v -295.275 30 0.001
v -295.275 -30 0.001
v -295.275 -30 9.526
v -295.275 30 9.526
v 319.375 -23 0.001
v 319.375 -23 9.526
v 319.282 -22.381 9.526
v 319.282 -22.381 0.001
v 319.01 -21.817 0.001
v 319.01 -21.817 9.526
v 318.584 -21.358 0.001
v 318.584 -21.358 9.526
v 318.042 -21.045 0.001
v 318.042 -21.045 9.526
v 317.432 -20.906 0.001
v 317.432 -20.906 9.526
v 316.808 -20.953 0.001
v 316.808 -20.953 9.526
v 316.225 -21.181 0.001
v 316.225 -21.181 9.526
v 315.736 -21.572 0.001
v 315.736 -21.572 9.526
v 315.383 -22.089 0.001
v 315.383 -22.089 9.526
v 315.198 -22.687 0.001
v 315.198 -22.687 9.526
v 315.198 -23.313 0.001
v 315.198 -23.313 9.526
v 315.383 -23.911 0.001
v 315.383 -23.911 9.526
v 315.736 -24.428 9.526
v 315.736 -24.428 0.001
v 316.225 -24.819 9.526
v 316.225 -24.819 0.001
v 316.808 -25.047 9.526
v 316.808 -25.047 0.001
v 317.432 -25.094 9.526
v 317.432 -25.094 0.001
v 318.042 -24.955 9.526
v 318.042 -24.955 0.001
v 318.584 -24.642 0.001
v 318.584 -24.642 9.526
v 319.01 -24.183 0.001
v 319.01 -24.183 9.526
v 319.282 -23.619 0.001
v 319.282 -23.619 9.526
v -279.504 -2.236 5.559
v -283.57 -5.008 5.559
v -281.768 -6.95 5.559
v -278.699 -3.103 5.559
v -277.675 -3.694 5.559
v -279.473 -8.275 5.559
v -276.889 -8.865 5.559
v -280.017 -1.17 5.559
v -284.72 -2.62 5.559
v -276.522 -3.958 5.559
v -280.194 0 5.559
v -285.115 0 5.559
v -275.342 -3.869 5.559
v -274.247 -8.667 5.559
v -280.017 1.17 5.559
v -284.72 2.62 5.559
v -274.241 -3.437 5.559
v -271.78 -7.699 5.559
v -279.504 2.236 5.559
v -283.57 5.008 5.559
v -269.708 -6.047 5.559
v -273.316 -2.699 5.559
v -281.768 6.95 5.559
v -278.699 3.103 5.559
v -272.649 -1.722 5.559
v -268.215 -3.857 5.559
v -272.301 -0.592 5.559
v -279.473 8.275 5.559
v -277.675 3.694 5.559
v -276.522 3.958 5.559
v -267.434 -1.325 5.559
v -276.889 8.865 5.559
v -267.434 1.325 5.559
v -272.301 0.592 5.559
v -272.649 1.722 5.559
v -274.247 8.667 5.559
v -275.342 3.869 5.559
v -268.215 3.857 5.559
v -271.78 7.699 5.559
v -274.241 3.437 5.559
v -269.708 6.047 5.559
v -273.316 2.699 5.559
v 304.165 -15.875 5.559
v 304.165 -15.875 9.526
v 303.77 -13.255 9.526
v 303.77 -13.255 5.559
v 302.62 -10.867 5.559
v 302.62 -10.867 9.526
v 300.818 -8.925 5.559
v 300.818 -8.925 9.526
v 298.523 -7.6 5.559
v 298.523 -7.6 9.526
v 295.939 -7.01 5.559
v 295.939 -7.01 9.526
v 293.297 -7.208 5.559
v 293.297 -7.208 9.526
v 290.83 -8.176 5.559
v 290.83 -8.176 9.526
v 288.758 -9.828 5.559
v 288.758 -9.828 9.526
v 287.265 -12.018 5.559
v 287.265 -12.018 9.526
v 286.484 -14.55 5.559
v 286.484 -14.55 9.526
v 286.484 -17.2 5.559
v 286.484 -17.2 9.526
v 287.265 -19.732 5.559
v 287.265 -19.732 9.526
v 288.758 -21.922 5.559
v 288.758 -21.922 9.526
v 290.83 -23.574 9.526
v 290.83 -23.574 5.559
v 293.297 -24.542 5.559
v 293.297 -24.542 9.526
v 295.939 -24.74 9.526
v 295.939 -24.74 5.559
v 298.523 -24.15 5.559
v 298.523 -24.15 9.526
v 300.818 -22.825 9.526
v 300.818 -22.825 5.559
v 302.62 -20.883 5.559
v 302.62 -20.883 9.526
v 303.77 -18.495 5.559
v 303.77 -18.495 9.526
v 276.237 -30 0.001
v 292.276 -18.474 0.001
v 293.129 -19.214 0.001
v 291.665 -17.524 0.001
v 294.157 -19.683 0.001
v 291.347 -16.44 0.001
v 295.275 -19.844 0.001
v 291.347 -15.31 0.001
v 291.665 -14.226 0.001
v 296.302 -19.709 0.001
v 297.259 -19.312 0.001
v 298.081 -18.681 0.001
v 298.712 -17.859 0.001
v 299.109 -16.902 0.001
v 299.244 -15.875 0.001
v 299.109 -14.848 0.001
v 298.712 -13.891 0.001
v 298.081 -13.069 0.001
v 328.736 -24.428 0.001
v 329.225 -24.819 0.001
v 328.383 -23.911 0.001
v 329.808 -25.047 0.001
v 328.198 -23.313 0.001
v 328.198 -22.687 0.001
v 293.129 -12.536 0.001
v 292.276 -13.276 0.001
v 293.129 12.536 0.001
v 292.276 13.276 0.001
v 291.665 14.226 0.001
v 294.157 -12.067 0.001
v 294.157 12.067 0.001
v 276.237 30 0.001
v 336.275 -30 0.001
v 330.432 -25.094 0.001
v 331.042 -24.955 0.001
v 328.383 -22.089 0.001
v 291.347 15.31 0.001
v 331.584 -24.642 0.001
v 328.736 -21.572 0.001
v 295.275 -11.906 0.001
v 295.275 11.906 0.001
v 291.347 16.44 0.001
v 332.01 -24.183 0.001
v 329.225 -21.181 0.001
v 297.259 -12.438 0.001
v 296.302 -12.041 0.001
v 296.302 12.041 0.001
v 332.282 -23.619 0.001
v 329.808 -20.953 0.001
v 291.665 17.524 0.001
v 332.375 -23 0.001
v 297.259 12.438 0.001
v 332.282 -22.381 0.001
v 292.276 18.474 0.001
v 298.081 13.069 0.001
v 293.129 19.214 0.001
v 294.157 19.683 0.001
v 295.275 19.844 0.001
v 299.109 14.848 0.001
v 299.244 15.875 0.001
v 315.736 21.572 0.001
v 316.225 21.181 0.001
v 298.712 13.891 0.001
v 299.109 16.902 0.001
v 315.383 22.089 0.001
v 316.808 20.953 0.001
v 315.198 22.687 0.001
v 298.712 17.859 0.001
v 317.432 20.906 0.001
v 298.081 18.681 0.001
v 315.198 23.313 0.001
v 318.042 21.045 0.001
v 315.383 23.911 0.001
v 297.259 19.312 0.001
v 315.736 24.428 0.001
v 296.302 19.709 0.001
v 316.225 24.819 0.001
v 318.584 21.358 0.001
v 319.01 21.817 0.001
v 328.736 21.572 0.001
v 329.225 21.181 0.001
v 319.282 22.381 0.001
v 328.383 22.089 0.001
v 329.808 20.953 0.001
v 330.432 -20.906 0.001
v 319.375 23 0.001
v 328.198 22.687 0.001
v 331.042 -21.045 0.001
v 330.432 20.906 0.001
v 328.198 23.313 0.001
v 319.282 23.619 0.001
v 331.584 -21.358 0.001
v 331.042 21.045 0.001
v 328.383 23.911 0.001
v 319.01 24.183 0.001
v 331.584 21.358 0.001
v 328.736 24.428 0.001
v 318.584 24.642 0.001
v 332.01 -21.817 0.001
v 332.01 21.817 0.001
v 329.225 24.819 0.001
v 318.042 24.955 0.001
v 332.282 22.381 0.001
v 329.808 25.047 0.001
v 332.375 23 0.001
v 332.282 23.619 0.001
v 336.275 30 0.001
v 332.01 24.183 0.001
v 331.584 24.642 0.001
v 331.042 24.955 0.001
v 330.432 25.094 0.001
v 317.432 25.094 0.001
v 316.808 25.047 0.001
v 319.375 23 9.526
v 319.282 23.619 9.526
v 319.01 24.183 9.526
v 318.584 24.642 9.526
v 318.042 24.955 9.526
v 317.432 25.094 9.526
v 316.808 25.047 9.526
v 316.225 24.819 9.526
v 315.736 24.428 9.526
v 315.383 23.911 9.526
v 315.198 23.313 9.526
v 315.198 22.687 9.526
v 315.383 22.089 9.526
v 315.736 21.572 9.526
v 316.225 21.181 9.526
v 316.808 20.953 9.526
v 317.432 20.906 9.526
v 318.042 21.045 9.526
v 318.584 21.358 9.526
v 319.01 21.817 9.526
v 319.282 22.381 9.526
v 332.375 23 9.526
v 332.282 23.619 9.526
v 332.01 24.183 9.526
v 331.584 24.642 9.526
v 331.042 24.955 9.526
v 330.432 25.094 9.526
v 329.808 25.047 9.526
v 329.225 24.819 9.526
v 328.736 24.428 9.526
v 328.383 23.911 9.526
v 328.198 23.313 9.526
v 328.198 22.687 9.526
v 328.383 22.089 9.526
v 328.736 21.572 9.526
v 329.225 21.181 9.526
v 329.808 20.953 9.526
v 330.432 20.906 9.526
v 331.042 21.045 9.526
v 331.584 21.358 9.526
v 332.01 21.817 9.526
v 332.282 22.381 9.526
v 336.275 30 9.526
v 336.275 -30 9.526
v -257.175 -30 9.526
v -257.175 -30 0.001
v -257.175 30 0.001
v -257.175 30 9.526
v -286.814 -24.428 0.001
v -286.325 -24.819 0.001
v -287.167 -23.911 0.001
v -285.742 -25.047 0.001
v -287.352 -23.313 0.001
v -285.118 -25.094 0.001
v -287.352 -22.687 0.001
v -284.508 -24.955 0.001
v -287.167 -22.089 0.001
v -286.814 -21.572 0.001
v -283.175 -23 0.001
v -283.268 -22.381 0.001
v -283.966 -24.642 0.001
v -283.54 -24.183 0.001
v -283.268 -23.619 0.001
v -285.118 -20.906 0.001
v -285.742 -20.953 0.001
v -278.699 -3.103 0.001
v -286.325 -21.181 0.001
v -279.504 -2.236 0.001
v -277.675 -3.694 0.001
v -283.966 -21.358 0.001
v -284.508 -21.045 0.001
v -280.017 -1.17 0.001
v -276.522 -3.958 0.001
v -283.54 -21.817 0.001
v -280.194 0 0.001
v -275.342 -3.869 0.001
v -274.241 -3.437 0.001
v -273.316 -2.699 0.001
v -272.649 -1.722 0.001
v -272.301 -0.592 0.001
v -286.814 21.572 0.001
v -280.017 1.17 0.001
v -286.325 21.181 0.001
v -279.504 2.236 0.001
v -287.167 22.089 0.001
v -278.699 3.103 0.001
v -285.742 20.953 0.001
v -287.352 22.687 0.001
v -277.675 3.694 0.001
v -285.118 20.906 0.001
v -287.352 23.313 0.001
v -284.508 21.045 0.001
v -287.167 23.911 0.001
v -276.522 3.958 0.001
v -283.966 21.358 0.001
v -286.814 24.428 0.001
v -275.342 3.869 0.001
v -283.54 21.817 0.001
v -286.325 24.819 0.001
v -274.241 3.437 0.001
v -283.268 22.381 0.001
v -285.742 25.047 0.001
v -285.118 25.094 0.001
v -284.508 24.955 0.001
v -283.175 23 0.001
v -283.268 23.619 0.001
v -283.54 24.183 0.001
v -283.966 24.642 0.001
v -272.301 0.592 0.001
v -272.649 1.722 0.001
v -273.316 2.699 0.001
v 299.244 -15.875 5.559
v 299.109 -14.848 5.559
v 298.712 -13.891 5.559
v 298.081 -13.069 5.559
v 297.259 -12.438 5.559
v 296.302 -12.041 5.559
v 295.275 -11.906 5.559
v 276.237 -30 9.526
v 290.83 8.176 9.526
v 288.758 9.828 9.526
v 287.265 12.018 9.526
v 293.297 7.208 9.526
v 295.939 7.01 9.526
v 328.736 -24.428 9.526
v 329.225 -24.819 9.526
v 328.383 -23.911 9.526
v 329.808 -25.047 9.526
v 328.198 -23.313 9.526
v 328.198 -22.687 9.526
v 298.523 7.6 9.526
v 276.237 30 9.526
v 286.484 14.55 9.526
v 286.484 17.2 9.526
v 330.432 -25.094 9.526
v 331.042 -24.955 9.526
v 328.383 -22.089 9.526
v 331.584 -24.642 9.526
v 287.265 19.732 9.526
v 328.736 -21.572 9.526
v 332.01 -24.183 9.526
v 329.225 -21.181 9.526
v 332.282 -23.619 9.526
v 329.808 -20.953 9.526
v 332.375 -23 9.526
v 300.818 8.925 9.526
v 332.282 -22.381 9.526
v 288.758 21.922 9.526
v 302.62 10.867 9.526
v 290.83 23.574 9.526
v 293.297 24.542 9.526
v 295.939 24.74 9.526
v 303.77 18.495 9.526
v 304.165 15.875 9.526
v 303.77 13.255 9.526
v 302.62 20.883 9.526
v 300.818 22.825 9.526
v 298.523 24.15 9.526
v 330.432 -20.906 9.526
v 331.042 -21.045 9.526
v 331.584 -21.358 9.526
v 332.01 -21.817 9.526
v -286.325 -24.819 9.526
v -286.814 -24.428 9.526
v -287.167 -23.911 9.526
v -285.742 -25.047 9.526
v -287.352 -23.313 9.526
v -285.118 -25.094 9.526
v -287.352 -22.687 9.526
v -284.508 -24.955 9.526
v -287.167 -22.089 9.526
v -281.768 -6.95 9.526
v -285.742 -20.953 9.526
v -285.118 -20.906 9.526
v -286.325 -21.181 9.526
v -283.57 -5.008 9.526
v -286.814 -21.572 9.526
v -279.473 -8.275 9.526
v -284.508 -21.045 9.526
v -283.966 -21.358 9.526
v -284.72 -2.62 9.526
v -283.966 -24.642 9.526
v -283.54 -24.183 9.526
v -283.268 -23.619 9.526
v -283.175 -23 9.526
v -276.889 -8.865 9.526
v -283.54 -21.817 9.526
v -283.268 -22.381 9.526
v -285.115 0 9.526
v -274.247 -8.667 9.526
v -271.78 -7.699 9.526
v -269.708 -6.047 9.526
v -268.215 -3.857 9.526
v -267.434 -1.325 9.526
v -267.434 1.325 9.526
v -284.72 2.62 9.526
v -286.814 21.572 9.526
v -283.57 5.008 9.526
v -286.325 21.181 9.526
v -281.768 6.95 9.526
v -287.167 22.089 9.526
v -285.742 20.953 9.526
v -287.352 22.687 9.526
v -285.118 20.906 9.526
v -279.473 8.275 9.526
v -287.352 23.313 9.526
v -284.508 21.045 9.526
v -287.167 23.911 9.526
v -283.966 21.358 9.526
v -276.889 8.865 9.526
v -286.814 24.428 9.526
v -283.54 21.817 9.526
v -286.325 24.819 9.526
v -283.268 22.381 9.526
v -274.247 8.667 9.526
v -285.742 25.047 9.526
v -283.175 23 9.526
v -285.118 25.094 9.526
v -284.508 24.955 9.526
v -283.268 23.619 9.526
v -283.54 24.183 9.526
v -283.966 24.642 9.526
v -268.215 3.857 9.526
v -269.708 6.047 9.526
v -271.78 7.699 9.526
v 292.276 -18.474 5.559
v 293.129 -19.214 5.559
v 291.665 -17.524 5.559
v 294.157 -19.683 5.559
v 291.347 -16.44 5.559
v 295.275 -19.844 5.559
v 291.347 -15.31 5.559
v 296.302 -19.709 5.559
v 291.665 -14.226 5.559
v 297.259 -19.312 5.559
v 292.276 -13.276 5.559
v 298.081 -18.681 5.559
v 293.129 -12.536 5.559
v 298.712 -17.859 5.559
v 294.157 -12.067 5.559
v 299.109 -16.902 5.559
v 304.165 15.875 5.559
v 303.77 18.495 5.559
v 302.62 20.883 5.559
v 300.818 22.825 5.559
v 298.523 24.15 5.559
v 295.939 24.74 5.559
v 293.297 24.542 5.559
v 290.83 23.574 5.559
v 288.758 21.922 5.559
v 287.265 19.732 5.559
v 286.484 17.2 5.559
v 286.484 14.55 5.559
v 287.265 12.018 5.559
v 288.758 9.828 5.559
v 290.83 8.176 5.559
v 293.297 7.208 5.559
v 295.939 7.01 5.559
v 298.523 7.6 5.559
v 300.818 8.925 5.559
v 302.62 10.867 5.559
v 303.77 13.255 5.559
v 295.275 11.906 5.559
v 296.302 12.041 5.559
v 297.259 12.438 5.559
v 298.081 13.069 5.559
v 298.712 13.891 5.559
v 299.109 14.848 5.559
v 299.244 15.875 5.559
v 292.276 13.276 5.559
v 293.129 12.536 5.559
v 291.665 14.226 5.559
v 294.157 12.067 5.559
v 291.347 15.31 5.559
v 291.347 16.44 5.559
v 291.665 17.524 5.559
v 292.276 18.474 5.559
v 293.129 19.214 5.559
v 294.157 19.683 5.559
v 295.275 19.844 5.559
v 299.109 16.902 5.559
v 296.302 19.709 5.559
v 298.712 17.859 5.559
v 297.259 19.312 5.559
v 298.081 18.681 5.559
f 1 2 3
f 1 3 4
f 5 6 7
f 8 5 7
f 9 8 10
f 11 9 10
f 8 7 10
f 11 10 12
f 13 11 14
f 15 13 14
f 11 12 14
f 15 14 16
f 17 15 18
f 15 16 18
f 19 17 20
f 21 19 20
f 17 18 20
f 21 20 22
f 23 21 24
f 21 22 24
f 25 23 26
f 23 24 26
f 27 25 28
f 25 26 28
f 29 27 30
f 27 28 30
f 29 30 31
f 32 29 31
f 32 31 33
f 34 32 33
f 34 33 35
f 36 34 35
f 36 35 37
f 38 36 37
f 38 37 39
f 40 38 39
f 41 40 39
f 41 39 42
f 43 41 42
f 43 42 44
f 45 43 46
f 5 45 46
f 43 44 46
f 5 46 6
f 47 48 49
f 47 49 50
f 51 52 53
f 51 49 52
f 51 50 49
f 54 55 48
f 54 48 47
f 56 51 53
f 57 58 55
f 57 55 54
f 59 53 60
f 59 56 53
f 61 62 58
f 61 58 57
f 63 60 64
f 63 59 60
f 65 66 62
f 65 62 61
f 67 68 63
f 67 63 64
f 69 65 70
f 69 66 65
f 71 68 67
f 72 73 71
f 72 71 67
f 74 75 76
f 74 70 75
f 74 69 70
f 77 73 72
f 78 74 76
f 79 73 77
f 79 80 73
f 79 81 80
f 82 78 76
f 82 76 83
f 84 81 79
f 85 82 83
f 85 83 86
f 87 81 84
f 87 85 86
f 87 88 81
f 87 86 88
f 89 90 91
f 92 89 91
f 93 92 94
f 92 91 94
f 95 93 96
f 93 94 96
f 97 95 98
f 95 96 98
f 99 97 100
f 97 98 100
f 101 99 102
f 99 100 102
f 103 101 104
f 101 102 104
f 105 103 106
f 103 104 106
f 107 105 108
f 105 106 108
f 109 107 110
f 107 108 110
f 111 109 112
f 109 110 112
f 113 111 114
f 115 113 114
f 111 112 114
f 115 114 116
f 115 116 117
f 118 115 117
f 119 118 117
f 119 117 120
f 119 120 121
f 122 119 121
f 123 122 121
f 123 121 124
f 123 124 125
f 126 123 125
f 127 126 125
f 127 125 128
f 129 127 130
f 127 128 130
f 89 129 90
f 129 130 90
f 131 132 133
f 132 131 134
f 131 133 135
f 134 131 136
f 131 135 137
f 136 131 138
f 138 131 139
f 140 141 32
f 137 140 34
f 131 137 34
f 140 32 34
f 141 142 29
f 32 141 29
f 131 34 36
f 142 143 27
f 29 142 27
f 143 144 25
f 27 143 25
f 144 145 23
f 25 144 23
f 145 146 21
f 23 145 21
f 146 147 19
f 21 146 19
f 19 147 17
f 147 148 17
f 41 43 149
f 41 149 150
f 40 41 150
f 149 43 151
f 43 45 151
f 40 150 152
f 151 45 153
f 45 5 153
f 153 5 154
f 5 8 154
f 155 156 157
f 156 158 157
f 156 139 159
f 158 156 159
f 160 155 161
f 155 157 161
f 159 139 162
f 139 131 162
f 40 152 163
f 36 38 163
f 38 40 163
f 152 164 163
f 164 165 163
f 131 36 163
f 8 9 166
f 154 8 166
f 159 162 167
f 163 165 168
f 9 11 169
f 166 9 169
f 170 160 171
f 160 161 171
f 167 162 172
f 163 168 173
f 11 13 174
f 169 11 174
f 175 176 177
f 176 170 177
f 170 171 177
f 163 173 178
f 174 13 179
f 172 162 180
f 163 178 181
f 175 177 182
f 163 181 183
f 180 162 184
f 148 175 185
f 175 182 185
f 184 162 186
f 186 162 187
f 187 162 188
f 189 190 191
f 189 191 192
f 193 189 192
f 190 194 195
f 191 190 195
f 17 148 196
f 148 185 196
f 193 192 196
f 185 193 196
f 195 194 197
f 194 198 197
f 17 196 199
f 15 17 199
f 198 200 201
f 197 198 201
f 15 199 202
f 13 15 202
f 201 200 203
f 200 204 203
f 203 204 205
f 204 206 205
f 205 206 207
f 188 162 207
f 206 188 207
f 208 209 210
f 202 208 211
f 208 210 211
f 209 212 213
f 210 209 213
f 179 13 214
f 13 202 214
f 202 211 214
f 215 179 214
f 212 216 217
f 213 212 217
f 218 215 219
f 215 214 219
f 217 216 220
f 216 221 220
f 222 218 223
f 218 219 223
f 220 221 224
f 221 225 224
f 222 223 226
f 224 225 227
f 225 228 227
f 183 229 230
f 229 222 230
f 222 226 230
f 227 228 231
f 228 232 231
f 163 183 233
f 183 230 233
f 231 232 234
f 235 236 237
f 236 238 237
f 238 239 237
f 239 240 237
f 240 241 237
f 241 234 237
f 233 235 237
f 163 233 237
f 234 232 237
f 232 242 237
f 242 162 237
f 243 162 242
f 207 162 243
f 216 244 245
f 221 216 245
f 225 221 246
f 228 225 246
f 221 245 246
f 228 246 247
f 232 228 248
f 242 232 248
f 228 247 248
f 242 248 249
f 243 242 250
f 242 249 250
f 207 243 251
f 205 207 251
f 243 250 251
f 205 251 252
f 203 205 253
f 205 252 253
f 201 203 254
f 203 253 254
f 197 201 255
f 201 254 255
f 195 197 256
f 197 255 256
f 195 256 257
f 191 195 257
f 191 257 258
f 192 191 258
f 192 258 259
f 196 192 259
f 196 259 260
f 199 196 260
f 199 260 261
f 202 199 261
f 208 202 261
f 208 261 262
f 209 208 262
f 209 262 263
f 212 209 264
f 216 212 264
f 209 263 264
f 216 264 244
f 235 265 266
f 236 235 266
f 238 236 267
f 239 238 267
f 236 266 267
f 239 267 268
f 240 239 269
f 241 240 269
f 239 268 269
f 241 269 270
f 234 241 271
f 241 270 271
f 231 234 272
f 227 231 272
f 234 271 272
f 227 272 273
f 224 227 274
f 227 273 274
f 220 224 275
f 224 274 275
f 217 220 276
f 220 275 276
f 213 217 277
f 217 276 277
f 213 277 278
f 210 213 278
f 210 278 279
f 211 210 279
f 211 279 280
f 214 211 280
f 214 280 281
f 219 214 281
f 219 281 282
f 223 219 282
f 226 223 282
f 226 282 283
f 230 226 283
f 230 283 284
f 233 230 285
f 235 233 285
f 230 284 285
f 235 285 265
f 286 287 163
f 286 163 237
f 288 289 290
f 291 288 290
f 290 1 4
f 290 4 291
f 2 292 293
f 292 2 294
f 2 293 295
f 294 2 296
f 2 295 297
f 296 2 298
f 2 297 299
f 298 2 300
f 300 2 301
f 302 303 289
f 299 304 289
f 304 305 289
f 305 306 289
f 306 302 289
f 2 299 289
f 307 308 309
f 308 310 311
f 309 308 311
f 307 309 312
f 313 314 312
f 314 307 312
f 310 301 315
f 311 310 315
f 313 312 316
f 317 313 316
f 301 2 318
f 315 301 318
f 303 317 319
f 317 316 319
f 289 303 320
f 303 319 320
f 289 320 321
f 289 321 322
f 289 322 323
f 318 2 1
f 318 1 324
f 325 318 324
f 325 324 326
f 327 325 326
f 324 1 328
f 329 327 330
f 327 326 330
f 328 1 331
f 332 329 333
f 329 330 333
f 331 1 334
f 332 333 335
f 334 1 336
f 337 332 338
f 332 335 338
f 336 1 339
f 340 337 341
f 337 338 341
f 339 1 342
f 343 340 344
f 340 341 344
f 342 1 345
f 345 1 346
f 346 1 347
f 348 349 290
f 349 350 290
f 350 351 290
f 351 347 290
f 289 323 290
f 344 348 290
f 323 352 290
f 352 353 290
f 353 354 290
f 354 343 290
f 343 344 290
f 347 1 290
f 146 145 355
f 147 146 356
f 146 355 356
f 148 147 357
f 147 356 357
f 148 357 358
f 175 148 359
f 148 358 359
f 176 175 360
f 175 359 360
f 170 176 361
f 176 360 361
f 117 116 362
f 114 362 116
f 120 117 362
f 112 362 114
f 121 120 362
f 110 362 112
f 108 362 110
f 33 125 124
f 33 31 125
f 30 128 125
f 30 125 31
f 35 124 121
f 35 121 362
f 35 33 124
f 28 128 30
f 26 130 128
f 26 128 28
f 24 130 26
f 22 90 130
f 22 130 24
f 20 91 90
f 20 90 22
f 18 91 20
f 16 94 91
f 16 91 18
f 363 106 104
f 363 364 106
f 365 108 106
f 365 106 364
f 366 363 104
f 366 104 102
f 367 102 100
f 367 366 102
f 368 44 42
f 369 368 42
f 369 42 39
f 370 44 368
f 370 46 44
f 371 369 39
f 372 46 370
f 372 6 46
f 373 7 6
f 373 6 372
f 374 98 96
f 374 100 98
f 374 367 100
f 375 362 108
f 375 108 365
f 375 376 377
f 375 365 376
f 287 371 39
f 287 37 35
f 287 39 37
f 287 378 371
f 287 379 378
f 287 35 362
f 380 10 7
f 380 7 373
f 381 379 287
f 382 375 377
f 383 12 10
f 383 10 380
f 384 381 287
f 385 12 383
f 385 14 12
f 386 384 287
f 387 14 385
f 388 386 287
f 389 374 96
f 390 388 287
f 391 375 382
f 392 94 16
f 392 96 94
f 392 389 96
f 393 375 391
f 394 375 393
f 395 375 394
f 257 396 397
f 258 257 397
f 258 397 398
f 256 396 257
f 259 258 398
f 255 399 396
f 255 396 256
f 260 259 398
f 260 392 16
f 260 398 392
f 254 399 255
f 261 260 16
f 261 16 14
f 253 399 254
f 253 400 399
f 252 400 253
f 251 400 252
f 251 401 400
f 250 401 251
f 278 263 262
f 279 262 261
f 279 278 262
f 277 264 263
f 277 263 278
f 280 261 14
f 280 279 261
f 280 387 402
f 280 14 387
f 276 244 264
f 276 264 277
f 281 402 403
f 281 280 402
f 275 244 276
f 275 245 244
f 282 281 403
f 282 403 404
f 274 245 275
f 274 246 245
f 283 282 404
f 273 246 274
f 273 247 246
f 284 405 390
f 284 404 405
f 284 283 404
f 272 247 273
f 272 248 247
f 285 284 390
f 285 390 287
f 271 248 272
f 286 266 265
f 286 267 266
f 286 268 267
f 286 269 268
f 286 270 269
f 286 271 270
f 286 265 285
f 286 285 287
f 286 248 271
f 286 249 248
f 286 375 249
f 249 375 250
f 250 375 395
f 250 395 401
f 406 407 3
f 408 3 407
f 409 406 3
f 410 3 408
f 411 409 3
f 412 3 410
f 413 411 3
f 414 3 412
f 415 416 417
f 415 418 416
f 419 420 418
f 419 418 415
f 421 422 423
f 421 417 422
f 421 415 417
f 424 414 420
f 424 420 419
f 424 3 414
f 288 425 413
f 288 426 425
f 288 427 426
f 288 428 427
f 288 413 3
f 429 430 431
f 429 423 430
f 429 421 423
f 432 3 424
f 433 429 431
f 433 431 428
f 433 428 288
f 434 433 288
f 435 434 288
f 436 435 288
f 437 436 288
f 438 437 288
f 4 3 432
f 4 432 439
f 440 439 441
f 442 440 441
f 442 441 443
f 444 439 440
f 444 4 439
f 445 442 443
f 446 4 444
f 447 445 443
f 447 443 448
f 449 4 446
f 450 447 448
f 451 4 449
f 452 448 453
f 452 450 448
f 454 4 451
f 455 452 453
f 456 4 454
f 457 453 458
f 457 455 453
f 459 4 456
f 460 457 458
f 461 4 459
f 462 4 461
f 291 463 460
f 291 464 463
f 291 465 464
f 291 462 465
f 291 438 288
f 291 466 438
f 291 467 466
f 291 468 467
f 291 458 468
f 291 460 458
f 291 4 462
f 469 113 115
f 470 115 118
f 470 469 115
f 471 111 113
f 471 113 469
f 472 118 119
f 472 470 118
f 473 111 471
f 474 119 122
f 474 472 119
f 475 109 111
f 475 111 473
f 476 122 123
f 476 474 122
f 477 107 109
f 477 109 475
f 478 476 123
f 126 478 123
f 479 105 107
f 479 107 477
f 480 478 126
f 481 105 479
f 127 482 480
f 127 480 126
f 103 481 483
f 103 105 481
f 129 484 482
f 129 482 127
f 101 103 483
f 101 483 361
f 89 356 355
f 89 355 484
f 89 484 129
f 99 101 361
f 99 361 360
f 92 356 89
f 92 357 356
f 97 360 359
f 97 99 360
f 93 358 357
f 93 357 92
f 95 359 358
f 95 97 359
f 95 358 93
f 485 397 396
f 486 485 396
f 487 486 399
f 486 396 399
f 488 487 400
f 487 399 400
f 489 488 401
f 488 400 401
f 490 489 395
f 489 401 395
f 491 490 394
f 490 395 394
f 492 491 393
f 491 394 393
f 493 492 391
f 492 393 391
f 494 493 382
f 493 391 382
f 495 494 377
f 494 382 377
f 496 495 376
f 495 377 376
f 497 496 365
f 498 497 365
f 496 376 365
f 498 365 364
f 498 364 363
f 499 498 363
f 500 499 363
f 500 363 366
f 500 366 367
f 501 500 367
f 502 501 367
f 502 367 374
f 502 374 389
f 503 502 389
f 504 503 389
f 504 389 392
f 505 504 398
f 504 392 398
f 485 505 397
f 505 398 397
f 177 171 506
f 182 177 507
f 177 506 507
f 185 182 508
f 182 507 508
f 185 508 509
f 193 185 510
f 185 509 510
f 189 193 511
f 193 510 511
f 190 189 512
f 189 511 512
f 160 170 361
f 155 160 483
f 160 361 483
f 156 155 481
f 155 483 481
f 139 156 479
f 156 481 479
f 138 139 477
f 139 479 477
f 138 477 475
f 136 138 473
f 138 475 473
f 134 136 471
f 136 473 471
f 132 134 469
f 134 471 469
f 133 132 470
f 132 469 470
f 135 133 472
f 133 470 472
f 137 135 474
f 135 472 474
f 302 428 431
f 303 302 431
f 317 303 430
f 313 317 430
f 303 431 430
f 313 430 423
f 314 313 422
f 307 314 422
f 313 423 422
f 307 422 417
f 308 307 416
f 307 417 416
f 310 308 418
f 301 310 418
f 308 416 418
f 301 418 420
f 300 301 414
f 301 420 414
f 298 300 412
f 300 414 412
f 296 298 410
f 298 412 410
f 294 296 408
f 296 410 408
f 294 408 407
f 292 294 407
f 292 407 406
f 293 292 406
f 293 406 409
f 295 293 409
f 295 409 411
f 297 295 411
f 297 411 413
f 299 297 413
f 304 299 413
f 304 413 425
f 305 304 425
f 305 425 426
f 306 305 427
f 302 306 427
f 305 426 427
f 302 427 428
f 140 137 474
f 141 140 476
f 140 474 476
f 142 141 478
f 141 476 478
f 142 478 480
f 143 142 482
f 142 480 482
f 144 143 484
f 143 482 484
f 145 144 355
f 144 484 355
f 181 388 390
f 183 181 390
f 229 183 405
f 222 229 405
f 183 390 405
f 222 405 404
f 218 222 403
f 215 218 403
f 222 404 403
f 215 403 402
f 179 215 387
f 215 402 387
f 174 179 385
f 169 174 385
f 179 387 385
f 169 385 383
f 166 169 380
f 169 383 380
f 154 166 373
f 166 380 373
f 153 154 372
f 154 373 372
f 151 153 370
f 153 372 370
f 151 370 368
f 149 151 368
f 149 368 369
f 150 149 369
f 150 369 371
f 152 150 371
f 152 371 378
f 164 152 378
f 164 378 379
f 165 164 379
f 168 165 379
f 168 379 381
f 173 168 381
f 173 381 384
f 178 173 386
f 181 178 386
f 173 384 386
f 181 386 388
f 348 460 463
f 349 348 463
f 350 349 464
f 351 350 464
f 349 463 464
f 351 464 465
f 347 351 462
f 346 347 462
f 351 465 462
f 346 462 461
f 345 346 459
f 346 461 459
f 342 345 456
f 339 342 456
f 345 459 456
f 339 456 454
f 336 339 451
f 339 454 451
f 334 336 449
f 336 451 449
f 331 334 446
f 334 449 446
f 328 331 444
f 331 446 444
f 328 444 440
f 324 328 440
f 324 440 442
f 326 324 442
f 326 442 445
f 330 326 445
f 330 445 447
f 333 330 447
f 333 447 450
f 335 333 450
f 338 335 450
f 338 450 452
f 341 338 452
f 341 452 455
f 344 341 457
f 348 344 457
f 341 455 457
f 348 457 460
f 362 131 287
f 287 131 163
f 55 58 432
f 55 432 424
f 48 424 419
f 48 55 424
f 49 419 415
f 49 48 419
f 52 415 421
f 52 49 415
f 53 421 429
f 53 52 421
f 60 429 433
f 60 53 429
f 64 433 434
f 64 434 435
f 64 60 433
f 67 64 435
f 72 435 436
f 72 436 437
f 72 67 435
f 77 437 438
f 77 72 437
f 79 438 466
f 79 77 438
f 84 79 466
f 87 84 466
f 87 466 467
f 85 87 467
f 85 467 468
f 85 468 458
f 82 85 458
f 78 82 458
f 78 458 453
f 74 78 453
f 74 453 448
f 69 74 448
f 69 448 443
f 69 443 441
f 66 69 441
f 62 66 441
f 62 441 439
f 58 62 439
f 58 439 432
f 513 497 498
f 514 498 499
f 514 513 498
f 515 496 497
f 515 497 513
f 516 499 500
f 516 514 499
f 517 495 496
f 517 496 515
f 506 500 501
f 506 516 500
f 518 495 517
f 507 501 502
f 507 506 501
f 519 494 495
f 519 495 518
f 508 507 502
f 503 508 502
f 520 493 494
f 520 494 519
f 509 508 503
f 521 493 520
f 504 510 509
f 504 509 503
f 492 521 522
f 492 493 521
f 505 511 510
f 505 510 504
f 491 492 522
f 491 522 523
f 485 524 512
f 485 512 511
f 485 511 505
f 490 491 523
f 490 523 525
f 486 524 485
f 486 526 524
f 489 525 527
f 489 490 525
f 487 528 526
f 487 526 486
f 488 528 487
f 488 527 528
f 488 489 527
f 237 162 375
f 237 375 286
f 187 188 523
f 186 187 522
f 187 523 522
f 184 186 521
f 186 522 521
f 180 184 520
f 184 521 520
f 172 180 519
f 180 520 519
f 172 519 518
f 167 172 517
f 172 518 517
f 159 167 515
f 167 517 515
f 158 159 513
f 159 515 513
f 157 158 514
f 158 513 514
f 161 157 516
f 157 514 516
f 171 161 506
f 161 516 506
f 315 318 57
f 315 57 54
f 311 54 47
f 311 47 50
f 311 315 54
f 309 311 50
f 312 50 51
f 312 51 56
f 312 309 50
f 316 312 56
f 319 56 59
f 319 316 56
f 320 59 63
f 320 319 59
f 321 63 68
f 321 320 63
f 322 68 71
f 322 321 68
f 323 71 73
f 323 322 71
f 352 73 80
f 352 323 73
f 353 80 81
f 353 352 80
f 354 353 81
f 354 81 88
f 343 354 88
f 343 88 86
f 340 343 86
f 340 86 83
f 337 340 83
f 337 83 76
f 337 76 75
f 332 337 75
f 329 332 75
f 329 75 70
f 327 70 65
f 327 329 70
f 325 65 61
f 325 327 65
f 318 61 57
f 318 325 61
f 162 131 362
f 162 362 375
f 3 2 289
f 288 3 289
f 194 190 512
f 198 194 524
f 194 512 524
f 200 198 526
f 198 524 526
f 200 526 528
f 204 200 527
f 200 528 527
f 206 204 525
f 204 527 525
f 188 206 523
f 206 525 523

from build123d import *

# Parameters (mm, degrees)
SKETCH2_W                                 = 66.588019288
SKETCH2_H                                 = 60
MAIN_EXTRUSION_DEPTH                      = 5.55752
SKETCH2_W_2                               = 38.1
SKETCH2_R                                 = 3.96875
MAIN_EXTRUSION_2_DEPTH                    = 5.55752
SKETCH2_3_W                               = 66.588019288
SKETCH2_3_H                               = 60
SKETCH2_3_W_2                             = 38.1
SKETCH2_3_R                               = 8.89
COUNTERBORE_EXTRUSION_DEPTH               = 9.525
SKETCH3_R                                 = 2.1
M5_THREADED_HOLSE_FOR_FRONT_BRACKET_DEPTH = 9.525
SKETCH5_R                                 = 2.1
M5_THREADED_HOLES_FOR_BRACKET_DEPTH       = 9.525
CENTRE_BORE_DEPTH                         = 345.266911292
SKETCH6_3_R                               = 8.89
SKETCH6_3_R_2                             = 3.96875
COUNTERBORE_DEPTH                         = 3.96748
SKETCH7_W                                 = 6.55
SKETCH7_H                                 = 60
STUPID_CUT_DEPTH                          = 345.266911292


with BuildPart() as part:
    # Sketch2 → Main Extrusion (new body)
    with BuildSketch(Plane(origin=(-0.000152858, 6.01e-07, 0.001029772), x_dir=(1, 0, 0), z_dir=(0, 0, 1))):
        with Locations((309.531143156, -6.01e-07)):
            Rectangle(SKETCH2_W, SKETCH2_H)
    extrude(amount=MAIN_EXTRUSION_DEPTH)



with BuildPart() as body_2:
    # Sketch2 → Main Extrusion 2 (new body)
    with BuildSketch(Plane(origin=(-0.000152858, 6.01e-07, 0.001029772), x_dir=(1, 0, 0), z_dir=(0, 0, 1))):
        with Locations((-276.224847142, -6.01e-07)):
            Rectangle(SKETCH2_W_2, SKETCH2_H)
        with Locations(Location((-276.224847142, -6.01e-07, 0), (0, 0, 180))):
            Circle(SKETCH2_R, mode=Mode.SUBTRACT)
    extrude(amount=MAIN_EXTRUSION_2_DEPTH)


with BuildPart() as part_1:
    add(part.part)

    add(body_2.part)  # Counterbore extrusion merges body 2
    # Sketch2<3> → Counterbore extrusion (add)
    # profile 1 of 2: a face of its own
    with BuildSketch(Plane(origin=(-0.000152858, 6.01e-07, 0.001029772), x_dir=(1, 0, 0), z_dir=(0, 0, 1))):
        with Locations((309.531143156, -6.01e-07)):
            Rectangle(SKETCH2_3_W, SKETCH2_3_H)
    # profile 2 of 2: a face of its own
    with BuildSketch(Plane(origin=(-0.000152858, 6.01e-07, 0.001029772), x_dir=(1, 0, 0), z_dir=(0, 0, 1))):
        with Locations((-276.224847142, -6.01e-07)):
            Rectangle(SKETCH2_3_W_2, SKETCH2_3_H)
        with Locations(Location((-276.224847142, -6.01e-07, 0), (0, 0, 180))):
            Circle(SKETCH2_3_R, mode=Mode.SUBTRACT)
    extrude(amount=COUNTERBORE_EXTRUSION_DEPTH)

    # Sketch3 → M5 Threaded holse for front bracket (cut)
    with BuildSketch(Plane.XY.offset(9.526029772)):
        with Locations((-285.275, 23)):
            Circle(SKETCH3_R)
        with Locations((-285.275, -23)):
            Circle(SKETCH3_R)
    extrude(amount=-M5_THREADED_HOLSE_FOR_FRONT_BRACKET_DEPTH, mode=Mode.SUBTRACT)

    # Sketch5 → M5 Threaded holes for bracket (cut)
    with BuildSketch(Plane.XY.offset(9.526029772)):
        with Locations((317.274999942, 23)):
            Circle(SKETCH5_R)
        with Locations((330.274999942, 23)):
            Circle(SKETCH5_R)
        with Locations((330.274999942, -23)):
            Circle(SKETCH5_R)
        with Locations((317.274999942, -23)):
            Circle(SKETCH5_R)
    extrude(amount=-M5_THREADED_HOLES_FOR_BRACKET_DEPTH, mode=Mode.SUBTRACT)

    # Sketch6 → centre bore (cut, through all)
    with BuildSketch(Plane.XY.offset(9.526029772)):
        with BuildLine():
            ThreePointArc((295.275, 19.84375), (291.30625, 15.875), (295.275, 11.90625))
            Line((295.275, 11.90625), (295.275, 19.84375))
        make_face()
        with BuildLine():
            Line((295.275, 19.84375), (295.275, 11.90625))
            ThreePointArc((295.275, 11.90625), (298.081330038, 13.068669962), (299.24375, 15.875))
            ThreePointArc((299.24375, 15.875), (298.081330038, 18.681330038), (295.275, 19.84375))
        make_face()
        with BuildLine():
            ThreePointArc((295.275, -11.90625), (291.30625, -15.875), (295.275, -19.84375))
            Line((295.275, -19.84375), (295.275, -11.90625))
        make_face()
        with BuildLine():
            Line((295.275, -11.90625), (295.275, -19.84375))
            ThreePointArc((295.275, -19.84375), (298.081330038, -18.681330038), (299.24375, -15.875))
            ThreePointArc((299.24375, -15.875), (298.081330038, -13.068669962), (295.275, -11.90625))
        make_face()
    extrude(amount=-CENTRE_BORE_DEPTH, mode=Mode.SUBTRACT)

    # Sketch6<3> → counterbore (cut)
    # profile 1 of 2: a face of its own
    with BuildSketch(Plane.XY.offset(9.526029772)):
        with Locations((295.275, 15.875)):
            Circle(SKETCH6_3_R)
        with Locations((295.275, 15.875)):
            Circle(SKETCH6_3_R_2, mode=Mode.SUBTRACT)
    # profile 2 of 2: a face of its own
    with BuildSketch(Plane.XY.offset(9.526029772)):
        with Locations((295.275, -15.875)):
            Circle(SKETCH6_3_R)
        with Locations((295.275, -15.875)):
            Circle(SKETCH6_3_R_2, mode=Mode.SUBTRACT)
    extrude(amount=-COUNTERBORE_DEPTH, mode=Mode.SUBTRACT)

    # Sketch7 → stupid cut (cut, through all)
    with BuildSketch(Plane.XY.offset(9.526029772)):
        with Locations((339.549999942, 0)):
            Rectangle(SKETCH7_W, SKETCH7_H)
    extrude(amount=-STUPID_CUT_DEPTH, mode=Mode.SUBTRACT)


solid = part_1.part
